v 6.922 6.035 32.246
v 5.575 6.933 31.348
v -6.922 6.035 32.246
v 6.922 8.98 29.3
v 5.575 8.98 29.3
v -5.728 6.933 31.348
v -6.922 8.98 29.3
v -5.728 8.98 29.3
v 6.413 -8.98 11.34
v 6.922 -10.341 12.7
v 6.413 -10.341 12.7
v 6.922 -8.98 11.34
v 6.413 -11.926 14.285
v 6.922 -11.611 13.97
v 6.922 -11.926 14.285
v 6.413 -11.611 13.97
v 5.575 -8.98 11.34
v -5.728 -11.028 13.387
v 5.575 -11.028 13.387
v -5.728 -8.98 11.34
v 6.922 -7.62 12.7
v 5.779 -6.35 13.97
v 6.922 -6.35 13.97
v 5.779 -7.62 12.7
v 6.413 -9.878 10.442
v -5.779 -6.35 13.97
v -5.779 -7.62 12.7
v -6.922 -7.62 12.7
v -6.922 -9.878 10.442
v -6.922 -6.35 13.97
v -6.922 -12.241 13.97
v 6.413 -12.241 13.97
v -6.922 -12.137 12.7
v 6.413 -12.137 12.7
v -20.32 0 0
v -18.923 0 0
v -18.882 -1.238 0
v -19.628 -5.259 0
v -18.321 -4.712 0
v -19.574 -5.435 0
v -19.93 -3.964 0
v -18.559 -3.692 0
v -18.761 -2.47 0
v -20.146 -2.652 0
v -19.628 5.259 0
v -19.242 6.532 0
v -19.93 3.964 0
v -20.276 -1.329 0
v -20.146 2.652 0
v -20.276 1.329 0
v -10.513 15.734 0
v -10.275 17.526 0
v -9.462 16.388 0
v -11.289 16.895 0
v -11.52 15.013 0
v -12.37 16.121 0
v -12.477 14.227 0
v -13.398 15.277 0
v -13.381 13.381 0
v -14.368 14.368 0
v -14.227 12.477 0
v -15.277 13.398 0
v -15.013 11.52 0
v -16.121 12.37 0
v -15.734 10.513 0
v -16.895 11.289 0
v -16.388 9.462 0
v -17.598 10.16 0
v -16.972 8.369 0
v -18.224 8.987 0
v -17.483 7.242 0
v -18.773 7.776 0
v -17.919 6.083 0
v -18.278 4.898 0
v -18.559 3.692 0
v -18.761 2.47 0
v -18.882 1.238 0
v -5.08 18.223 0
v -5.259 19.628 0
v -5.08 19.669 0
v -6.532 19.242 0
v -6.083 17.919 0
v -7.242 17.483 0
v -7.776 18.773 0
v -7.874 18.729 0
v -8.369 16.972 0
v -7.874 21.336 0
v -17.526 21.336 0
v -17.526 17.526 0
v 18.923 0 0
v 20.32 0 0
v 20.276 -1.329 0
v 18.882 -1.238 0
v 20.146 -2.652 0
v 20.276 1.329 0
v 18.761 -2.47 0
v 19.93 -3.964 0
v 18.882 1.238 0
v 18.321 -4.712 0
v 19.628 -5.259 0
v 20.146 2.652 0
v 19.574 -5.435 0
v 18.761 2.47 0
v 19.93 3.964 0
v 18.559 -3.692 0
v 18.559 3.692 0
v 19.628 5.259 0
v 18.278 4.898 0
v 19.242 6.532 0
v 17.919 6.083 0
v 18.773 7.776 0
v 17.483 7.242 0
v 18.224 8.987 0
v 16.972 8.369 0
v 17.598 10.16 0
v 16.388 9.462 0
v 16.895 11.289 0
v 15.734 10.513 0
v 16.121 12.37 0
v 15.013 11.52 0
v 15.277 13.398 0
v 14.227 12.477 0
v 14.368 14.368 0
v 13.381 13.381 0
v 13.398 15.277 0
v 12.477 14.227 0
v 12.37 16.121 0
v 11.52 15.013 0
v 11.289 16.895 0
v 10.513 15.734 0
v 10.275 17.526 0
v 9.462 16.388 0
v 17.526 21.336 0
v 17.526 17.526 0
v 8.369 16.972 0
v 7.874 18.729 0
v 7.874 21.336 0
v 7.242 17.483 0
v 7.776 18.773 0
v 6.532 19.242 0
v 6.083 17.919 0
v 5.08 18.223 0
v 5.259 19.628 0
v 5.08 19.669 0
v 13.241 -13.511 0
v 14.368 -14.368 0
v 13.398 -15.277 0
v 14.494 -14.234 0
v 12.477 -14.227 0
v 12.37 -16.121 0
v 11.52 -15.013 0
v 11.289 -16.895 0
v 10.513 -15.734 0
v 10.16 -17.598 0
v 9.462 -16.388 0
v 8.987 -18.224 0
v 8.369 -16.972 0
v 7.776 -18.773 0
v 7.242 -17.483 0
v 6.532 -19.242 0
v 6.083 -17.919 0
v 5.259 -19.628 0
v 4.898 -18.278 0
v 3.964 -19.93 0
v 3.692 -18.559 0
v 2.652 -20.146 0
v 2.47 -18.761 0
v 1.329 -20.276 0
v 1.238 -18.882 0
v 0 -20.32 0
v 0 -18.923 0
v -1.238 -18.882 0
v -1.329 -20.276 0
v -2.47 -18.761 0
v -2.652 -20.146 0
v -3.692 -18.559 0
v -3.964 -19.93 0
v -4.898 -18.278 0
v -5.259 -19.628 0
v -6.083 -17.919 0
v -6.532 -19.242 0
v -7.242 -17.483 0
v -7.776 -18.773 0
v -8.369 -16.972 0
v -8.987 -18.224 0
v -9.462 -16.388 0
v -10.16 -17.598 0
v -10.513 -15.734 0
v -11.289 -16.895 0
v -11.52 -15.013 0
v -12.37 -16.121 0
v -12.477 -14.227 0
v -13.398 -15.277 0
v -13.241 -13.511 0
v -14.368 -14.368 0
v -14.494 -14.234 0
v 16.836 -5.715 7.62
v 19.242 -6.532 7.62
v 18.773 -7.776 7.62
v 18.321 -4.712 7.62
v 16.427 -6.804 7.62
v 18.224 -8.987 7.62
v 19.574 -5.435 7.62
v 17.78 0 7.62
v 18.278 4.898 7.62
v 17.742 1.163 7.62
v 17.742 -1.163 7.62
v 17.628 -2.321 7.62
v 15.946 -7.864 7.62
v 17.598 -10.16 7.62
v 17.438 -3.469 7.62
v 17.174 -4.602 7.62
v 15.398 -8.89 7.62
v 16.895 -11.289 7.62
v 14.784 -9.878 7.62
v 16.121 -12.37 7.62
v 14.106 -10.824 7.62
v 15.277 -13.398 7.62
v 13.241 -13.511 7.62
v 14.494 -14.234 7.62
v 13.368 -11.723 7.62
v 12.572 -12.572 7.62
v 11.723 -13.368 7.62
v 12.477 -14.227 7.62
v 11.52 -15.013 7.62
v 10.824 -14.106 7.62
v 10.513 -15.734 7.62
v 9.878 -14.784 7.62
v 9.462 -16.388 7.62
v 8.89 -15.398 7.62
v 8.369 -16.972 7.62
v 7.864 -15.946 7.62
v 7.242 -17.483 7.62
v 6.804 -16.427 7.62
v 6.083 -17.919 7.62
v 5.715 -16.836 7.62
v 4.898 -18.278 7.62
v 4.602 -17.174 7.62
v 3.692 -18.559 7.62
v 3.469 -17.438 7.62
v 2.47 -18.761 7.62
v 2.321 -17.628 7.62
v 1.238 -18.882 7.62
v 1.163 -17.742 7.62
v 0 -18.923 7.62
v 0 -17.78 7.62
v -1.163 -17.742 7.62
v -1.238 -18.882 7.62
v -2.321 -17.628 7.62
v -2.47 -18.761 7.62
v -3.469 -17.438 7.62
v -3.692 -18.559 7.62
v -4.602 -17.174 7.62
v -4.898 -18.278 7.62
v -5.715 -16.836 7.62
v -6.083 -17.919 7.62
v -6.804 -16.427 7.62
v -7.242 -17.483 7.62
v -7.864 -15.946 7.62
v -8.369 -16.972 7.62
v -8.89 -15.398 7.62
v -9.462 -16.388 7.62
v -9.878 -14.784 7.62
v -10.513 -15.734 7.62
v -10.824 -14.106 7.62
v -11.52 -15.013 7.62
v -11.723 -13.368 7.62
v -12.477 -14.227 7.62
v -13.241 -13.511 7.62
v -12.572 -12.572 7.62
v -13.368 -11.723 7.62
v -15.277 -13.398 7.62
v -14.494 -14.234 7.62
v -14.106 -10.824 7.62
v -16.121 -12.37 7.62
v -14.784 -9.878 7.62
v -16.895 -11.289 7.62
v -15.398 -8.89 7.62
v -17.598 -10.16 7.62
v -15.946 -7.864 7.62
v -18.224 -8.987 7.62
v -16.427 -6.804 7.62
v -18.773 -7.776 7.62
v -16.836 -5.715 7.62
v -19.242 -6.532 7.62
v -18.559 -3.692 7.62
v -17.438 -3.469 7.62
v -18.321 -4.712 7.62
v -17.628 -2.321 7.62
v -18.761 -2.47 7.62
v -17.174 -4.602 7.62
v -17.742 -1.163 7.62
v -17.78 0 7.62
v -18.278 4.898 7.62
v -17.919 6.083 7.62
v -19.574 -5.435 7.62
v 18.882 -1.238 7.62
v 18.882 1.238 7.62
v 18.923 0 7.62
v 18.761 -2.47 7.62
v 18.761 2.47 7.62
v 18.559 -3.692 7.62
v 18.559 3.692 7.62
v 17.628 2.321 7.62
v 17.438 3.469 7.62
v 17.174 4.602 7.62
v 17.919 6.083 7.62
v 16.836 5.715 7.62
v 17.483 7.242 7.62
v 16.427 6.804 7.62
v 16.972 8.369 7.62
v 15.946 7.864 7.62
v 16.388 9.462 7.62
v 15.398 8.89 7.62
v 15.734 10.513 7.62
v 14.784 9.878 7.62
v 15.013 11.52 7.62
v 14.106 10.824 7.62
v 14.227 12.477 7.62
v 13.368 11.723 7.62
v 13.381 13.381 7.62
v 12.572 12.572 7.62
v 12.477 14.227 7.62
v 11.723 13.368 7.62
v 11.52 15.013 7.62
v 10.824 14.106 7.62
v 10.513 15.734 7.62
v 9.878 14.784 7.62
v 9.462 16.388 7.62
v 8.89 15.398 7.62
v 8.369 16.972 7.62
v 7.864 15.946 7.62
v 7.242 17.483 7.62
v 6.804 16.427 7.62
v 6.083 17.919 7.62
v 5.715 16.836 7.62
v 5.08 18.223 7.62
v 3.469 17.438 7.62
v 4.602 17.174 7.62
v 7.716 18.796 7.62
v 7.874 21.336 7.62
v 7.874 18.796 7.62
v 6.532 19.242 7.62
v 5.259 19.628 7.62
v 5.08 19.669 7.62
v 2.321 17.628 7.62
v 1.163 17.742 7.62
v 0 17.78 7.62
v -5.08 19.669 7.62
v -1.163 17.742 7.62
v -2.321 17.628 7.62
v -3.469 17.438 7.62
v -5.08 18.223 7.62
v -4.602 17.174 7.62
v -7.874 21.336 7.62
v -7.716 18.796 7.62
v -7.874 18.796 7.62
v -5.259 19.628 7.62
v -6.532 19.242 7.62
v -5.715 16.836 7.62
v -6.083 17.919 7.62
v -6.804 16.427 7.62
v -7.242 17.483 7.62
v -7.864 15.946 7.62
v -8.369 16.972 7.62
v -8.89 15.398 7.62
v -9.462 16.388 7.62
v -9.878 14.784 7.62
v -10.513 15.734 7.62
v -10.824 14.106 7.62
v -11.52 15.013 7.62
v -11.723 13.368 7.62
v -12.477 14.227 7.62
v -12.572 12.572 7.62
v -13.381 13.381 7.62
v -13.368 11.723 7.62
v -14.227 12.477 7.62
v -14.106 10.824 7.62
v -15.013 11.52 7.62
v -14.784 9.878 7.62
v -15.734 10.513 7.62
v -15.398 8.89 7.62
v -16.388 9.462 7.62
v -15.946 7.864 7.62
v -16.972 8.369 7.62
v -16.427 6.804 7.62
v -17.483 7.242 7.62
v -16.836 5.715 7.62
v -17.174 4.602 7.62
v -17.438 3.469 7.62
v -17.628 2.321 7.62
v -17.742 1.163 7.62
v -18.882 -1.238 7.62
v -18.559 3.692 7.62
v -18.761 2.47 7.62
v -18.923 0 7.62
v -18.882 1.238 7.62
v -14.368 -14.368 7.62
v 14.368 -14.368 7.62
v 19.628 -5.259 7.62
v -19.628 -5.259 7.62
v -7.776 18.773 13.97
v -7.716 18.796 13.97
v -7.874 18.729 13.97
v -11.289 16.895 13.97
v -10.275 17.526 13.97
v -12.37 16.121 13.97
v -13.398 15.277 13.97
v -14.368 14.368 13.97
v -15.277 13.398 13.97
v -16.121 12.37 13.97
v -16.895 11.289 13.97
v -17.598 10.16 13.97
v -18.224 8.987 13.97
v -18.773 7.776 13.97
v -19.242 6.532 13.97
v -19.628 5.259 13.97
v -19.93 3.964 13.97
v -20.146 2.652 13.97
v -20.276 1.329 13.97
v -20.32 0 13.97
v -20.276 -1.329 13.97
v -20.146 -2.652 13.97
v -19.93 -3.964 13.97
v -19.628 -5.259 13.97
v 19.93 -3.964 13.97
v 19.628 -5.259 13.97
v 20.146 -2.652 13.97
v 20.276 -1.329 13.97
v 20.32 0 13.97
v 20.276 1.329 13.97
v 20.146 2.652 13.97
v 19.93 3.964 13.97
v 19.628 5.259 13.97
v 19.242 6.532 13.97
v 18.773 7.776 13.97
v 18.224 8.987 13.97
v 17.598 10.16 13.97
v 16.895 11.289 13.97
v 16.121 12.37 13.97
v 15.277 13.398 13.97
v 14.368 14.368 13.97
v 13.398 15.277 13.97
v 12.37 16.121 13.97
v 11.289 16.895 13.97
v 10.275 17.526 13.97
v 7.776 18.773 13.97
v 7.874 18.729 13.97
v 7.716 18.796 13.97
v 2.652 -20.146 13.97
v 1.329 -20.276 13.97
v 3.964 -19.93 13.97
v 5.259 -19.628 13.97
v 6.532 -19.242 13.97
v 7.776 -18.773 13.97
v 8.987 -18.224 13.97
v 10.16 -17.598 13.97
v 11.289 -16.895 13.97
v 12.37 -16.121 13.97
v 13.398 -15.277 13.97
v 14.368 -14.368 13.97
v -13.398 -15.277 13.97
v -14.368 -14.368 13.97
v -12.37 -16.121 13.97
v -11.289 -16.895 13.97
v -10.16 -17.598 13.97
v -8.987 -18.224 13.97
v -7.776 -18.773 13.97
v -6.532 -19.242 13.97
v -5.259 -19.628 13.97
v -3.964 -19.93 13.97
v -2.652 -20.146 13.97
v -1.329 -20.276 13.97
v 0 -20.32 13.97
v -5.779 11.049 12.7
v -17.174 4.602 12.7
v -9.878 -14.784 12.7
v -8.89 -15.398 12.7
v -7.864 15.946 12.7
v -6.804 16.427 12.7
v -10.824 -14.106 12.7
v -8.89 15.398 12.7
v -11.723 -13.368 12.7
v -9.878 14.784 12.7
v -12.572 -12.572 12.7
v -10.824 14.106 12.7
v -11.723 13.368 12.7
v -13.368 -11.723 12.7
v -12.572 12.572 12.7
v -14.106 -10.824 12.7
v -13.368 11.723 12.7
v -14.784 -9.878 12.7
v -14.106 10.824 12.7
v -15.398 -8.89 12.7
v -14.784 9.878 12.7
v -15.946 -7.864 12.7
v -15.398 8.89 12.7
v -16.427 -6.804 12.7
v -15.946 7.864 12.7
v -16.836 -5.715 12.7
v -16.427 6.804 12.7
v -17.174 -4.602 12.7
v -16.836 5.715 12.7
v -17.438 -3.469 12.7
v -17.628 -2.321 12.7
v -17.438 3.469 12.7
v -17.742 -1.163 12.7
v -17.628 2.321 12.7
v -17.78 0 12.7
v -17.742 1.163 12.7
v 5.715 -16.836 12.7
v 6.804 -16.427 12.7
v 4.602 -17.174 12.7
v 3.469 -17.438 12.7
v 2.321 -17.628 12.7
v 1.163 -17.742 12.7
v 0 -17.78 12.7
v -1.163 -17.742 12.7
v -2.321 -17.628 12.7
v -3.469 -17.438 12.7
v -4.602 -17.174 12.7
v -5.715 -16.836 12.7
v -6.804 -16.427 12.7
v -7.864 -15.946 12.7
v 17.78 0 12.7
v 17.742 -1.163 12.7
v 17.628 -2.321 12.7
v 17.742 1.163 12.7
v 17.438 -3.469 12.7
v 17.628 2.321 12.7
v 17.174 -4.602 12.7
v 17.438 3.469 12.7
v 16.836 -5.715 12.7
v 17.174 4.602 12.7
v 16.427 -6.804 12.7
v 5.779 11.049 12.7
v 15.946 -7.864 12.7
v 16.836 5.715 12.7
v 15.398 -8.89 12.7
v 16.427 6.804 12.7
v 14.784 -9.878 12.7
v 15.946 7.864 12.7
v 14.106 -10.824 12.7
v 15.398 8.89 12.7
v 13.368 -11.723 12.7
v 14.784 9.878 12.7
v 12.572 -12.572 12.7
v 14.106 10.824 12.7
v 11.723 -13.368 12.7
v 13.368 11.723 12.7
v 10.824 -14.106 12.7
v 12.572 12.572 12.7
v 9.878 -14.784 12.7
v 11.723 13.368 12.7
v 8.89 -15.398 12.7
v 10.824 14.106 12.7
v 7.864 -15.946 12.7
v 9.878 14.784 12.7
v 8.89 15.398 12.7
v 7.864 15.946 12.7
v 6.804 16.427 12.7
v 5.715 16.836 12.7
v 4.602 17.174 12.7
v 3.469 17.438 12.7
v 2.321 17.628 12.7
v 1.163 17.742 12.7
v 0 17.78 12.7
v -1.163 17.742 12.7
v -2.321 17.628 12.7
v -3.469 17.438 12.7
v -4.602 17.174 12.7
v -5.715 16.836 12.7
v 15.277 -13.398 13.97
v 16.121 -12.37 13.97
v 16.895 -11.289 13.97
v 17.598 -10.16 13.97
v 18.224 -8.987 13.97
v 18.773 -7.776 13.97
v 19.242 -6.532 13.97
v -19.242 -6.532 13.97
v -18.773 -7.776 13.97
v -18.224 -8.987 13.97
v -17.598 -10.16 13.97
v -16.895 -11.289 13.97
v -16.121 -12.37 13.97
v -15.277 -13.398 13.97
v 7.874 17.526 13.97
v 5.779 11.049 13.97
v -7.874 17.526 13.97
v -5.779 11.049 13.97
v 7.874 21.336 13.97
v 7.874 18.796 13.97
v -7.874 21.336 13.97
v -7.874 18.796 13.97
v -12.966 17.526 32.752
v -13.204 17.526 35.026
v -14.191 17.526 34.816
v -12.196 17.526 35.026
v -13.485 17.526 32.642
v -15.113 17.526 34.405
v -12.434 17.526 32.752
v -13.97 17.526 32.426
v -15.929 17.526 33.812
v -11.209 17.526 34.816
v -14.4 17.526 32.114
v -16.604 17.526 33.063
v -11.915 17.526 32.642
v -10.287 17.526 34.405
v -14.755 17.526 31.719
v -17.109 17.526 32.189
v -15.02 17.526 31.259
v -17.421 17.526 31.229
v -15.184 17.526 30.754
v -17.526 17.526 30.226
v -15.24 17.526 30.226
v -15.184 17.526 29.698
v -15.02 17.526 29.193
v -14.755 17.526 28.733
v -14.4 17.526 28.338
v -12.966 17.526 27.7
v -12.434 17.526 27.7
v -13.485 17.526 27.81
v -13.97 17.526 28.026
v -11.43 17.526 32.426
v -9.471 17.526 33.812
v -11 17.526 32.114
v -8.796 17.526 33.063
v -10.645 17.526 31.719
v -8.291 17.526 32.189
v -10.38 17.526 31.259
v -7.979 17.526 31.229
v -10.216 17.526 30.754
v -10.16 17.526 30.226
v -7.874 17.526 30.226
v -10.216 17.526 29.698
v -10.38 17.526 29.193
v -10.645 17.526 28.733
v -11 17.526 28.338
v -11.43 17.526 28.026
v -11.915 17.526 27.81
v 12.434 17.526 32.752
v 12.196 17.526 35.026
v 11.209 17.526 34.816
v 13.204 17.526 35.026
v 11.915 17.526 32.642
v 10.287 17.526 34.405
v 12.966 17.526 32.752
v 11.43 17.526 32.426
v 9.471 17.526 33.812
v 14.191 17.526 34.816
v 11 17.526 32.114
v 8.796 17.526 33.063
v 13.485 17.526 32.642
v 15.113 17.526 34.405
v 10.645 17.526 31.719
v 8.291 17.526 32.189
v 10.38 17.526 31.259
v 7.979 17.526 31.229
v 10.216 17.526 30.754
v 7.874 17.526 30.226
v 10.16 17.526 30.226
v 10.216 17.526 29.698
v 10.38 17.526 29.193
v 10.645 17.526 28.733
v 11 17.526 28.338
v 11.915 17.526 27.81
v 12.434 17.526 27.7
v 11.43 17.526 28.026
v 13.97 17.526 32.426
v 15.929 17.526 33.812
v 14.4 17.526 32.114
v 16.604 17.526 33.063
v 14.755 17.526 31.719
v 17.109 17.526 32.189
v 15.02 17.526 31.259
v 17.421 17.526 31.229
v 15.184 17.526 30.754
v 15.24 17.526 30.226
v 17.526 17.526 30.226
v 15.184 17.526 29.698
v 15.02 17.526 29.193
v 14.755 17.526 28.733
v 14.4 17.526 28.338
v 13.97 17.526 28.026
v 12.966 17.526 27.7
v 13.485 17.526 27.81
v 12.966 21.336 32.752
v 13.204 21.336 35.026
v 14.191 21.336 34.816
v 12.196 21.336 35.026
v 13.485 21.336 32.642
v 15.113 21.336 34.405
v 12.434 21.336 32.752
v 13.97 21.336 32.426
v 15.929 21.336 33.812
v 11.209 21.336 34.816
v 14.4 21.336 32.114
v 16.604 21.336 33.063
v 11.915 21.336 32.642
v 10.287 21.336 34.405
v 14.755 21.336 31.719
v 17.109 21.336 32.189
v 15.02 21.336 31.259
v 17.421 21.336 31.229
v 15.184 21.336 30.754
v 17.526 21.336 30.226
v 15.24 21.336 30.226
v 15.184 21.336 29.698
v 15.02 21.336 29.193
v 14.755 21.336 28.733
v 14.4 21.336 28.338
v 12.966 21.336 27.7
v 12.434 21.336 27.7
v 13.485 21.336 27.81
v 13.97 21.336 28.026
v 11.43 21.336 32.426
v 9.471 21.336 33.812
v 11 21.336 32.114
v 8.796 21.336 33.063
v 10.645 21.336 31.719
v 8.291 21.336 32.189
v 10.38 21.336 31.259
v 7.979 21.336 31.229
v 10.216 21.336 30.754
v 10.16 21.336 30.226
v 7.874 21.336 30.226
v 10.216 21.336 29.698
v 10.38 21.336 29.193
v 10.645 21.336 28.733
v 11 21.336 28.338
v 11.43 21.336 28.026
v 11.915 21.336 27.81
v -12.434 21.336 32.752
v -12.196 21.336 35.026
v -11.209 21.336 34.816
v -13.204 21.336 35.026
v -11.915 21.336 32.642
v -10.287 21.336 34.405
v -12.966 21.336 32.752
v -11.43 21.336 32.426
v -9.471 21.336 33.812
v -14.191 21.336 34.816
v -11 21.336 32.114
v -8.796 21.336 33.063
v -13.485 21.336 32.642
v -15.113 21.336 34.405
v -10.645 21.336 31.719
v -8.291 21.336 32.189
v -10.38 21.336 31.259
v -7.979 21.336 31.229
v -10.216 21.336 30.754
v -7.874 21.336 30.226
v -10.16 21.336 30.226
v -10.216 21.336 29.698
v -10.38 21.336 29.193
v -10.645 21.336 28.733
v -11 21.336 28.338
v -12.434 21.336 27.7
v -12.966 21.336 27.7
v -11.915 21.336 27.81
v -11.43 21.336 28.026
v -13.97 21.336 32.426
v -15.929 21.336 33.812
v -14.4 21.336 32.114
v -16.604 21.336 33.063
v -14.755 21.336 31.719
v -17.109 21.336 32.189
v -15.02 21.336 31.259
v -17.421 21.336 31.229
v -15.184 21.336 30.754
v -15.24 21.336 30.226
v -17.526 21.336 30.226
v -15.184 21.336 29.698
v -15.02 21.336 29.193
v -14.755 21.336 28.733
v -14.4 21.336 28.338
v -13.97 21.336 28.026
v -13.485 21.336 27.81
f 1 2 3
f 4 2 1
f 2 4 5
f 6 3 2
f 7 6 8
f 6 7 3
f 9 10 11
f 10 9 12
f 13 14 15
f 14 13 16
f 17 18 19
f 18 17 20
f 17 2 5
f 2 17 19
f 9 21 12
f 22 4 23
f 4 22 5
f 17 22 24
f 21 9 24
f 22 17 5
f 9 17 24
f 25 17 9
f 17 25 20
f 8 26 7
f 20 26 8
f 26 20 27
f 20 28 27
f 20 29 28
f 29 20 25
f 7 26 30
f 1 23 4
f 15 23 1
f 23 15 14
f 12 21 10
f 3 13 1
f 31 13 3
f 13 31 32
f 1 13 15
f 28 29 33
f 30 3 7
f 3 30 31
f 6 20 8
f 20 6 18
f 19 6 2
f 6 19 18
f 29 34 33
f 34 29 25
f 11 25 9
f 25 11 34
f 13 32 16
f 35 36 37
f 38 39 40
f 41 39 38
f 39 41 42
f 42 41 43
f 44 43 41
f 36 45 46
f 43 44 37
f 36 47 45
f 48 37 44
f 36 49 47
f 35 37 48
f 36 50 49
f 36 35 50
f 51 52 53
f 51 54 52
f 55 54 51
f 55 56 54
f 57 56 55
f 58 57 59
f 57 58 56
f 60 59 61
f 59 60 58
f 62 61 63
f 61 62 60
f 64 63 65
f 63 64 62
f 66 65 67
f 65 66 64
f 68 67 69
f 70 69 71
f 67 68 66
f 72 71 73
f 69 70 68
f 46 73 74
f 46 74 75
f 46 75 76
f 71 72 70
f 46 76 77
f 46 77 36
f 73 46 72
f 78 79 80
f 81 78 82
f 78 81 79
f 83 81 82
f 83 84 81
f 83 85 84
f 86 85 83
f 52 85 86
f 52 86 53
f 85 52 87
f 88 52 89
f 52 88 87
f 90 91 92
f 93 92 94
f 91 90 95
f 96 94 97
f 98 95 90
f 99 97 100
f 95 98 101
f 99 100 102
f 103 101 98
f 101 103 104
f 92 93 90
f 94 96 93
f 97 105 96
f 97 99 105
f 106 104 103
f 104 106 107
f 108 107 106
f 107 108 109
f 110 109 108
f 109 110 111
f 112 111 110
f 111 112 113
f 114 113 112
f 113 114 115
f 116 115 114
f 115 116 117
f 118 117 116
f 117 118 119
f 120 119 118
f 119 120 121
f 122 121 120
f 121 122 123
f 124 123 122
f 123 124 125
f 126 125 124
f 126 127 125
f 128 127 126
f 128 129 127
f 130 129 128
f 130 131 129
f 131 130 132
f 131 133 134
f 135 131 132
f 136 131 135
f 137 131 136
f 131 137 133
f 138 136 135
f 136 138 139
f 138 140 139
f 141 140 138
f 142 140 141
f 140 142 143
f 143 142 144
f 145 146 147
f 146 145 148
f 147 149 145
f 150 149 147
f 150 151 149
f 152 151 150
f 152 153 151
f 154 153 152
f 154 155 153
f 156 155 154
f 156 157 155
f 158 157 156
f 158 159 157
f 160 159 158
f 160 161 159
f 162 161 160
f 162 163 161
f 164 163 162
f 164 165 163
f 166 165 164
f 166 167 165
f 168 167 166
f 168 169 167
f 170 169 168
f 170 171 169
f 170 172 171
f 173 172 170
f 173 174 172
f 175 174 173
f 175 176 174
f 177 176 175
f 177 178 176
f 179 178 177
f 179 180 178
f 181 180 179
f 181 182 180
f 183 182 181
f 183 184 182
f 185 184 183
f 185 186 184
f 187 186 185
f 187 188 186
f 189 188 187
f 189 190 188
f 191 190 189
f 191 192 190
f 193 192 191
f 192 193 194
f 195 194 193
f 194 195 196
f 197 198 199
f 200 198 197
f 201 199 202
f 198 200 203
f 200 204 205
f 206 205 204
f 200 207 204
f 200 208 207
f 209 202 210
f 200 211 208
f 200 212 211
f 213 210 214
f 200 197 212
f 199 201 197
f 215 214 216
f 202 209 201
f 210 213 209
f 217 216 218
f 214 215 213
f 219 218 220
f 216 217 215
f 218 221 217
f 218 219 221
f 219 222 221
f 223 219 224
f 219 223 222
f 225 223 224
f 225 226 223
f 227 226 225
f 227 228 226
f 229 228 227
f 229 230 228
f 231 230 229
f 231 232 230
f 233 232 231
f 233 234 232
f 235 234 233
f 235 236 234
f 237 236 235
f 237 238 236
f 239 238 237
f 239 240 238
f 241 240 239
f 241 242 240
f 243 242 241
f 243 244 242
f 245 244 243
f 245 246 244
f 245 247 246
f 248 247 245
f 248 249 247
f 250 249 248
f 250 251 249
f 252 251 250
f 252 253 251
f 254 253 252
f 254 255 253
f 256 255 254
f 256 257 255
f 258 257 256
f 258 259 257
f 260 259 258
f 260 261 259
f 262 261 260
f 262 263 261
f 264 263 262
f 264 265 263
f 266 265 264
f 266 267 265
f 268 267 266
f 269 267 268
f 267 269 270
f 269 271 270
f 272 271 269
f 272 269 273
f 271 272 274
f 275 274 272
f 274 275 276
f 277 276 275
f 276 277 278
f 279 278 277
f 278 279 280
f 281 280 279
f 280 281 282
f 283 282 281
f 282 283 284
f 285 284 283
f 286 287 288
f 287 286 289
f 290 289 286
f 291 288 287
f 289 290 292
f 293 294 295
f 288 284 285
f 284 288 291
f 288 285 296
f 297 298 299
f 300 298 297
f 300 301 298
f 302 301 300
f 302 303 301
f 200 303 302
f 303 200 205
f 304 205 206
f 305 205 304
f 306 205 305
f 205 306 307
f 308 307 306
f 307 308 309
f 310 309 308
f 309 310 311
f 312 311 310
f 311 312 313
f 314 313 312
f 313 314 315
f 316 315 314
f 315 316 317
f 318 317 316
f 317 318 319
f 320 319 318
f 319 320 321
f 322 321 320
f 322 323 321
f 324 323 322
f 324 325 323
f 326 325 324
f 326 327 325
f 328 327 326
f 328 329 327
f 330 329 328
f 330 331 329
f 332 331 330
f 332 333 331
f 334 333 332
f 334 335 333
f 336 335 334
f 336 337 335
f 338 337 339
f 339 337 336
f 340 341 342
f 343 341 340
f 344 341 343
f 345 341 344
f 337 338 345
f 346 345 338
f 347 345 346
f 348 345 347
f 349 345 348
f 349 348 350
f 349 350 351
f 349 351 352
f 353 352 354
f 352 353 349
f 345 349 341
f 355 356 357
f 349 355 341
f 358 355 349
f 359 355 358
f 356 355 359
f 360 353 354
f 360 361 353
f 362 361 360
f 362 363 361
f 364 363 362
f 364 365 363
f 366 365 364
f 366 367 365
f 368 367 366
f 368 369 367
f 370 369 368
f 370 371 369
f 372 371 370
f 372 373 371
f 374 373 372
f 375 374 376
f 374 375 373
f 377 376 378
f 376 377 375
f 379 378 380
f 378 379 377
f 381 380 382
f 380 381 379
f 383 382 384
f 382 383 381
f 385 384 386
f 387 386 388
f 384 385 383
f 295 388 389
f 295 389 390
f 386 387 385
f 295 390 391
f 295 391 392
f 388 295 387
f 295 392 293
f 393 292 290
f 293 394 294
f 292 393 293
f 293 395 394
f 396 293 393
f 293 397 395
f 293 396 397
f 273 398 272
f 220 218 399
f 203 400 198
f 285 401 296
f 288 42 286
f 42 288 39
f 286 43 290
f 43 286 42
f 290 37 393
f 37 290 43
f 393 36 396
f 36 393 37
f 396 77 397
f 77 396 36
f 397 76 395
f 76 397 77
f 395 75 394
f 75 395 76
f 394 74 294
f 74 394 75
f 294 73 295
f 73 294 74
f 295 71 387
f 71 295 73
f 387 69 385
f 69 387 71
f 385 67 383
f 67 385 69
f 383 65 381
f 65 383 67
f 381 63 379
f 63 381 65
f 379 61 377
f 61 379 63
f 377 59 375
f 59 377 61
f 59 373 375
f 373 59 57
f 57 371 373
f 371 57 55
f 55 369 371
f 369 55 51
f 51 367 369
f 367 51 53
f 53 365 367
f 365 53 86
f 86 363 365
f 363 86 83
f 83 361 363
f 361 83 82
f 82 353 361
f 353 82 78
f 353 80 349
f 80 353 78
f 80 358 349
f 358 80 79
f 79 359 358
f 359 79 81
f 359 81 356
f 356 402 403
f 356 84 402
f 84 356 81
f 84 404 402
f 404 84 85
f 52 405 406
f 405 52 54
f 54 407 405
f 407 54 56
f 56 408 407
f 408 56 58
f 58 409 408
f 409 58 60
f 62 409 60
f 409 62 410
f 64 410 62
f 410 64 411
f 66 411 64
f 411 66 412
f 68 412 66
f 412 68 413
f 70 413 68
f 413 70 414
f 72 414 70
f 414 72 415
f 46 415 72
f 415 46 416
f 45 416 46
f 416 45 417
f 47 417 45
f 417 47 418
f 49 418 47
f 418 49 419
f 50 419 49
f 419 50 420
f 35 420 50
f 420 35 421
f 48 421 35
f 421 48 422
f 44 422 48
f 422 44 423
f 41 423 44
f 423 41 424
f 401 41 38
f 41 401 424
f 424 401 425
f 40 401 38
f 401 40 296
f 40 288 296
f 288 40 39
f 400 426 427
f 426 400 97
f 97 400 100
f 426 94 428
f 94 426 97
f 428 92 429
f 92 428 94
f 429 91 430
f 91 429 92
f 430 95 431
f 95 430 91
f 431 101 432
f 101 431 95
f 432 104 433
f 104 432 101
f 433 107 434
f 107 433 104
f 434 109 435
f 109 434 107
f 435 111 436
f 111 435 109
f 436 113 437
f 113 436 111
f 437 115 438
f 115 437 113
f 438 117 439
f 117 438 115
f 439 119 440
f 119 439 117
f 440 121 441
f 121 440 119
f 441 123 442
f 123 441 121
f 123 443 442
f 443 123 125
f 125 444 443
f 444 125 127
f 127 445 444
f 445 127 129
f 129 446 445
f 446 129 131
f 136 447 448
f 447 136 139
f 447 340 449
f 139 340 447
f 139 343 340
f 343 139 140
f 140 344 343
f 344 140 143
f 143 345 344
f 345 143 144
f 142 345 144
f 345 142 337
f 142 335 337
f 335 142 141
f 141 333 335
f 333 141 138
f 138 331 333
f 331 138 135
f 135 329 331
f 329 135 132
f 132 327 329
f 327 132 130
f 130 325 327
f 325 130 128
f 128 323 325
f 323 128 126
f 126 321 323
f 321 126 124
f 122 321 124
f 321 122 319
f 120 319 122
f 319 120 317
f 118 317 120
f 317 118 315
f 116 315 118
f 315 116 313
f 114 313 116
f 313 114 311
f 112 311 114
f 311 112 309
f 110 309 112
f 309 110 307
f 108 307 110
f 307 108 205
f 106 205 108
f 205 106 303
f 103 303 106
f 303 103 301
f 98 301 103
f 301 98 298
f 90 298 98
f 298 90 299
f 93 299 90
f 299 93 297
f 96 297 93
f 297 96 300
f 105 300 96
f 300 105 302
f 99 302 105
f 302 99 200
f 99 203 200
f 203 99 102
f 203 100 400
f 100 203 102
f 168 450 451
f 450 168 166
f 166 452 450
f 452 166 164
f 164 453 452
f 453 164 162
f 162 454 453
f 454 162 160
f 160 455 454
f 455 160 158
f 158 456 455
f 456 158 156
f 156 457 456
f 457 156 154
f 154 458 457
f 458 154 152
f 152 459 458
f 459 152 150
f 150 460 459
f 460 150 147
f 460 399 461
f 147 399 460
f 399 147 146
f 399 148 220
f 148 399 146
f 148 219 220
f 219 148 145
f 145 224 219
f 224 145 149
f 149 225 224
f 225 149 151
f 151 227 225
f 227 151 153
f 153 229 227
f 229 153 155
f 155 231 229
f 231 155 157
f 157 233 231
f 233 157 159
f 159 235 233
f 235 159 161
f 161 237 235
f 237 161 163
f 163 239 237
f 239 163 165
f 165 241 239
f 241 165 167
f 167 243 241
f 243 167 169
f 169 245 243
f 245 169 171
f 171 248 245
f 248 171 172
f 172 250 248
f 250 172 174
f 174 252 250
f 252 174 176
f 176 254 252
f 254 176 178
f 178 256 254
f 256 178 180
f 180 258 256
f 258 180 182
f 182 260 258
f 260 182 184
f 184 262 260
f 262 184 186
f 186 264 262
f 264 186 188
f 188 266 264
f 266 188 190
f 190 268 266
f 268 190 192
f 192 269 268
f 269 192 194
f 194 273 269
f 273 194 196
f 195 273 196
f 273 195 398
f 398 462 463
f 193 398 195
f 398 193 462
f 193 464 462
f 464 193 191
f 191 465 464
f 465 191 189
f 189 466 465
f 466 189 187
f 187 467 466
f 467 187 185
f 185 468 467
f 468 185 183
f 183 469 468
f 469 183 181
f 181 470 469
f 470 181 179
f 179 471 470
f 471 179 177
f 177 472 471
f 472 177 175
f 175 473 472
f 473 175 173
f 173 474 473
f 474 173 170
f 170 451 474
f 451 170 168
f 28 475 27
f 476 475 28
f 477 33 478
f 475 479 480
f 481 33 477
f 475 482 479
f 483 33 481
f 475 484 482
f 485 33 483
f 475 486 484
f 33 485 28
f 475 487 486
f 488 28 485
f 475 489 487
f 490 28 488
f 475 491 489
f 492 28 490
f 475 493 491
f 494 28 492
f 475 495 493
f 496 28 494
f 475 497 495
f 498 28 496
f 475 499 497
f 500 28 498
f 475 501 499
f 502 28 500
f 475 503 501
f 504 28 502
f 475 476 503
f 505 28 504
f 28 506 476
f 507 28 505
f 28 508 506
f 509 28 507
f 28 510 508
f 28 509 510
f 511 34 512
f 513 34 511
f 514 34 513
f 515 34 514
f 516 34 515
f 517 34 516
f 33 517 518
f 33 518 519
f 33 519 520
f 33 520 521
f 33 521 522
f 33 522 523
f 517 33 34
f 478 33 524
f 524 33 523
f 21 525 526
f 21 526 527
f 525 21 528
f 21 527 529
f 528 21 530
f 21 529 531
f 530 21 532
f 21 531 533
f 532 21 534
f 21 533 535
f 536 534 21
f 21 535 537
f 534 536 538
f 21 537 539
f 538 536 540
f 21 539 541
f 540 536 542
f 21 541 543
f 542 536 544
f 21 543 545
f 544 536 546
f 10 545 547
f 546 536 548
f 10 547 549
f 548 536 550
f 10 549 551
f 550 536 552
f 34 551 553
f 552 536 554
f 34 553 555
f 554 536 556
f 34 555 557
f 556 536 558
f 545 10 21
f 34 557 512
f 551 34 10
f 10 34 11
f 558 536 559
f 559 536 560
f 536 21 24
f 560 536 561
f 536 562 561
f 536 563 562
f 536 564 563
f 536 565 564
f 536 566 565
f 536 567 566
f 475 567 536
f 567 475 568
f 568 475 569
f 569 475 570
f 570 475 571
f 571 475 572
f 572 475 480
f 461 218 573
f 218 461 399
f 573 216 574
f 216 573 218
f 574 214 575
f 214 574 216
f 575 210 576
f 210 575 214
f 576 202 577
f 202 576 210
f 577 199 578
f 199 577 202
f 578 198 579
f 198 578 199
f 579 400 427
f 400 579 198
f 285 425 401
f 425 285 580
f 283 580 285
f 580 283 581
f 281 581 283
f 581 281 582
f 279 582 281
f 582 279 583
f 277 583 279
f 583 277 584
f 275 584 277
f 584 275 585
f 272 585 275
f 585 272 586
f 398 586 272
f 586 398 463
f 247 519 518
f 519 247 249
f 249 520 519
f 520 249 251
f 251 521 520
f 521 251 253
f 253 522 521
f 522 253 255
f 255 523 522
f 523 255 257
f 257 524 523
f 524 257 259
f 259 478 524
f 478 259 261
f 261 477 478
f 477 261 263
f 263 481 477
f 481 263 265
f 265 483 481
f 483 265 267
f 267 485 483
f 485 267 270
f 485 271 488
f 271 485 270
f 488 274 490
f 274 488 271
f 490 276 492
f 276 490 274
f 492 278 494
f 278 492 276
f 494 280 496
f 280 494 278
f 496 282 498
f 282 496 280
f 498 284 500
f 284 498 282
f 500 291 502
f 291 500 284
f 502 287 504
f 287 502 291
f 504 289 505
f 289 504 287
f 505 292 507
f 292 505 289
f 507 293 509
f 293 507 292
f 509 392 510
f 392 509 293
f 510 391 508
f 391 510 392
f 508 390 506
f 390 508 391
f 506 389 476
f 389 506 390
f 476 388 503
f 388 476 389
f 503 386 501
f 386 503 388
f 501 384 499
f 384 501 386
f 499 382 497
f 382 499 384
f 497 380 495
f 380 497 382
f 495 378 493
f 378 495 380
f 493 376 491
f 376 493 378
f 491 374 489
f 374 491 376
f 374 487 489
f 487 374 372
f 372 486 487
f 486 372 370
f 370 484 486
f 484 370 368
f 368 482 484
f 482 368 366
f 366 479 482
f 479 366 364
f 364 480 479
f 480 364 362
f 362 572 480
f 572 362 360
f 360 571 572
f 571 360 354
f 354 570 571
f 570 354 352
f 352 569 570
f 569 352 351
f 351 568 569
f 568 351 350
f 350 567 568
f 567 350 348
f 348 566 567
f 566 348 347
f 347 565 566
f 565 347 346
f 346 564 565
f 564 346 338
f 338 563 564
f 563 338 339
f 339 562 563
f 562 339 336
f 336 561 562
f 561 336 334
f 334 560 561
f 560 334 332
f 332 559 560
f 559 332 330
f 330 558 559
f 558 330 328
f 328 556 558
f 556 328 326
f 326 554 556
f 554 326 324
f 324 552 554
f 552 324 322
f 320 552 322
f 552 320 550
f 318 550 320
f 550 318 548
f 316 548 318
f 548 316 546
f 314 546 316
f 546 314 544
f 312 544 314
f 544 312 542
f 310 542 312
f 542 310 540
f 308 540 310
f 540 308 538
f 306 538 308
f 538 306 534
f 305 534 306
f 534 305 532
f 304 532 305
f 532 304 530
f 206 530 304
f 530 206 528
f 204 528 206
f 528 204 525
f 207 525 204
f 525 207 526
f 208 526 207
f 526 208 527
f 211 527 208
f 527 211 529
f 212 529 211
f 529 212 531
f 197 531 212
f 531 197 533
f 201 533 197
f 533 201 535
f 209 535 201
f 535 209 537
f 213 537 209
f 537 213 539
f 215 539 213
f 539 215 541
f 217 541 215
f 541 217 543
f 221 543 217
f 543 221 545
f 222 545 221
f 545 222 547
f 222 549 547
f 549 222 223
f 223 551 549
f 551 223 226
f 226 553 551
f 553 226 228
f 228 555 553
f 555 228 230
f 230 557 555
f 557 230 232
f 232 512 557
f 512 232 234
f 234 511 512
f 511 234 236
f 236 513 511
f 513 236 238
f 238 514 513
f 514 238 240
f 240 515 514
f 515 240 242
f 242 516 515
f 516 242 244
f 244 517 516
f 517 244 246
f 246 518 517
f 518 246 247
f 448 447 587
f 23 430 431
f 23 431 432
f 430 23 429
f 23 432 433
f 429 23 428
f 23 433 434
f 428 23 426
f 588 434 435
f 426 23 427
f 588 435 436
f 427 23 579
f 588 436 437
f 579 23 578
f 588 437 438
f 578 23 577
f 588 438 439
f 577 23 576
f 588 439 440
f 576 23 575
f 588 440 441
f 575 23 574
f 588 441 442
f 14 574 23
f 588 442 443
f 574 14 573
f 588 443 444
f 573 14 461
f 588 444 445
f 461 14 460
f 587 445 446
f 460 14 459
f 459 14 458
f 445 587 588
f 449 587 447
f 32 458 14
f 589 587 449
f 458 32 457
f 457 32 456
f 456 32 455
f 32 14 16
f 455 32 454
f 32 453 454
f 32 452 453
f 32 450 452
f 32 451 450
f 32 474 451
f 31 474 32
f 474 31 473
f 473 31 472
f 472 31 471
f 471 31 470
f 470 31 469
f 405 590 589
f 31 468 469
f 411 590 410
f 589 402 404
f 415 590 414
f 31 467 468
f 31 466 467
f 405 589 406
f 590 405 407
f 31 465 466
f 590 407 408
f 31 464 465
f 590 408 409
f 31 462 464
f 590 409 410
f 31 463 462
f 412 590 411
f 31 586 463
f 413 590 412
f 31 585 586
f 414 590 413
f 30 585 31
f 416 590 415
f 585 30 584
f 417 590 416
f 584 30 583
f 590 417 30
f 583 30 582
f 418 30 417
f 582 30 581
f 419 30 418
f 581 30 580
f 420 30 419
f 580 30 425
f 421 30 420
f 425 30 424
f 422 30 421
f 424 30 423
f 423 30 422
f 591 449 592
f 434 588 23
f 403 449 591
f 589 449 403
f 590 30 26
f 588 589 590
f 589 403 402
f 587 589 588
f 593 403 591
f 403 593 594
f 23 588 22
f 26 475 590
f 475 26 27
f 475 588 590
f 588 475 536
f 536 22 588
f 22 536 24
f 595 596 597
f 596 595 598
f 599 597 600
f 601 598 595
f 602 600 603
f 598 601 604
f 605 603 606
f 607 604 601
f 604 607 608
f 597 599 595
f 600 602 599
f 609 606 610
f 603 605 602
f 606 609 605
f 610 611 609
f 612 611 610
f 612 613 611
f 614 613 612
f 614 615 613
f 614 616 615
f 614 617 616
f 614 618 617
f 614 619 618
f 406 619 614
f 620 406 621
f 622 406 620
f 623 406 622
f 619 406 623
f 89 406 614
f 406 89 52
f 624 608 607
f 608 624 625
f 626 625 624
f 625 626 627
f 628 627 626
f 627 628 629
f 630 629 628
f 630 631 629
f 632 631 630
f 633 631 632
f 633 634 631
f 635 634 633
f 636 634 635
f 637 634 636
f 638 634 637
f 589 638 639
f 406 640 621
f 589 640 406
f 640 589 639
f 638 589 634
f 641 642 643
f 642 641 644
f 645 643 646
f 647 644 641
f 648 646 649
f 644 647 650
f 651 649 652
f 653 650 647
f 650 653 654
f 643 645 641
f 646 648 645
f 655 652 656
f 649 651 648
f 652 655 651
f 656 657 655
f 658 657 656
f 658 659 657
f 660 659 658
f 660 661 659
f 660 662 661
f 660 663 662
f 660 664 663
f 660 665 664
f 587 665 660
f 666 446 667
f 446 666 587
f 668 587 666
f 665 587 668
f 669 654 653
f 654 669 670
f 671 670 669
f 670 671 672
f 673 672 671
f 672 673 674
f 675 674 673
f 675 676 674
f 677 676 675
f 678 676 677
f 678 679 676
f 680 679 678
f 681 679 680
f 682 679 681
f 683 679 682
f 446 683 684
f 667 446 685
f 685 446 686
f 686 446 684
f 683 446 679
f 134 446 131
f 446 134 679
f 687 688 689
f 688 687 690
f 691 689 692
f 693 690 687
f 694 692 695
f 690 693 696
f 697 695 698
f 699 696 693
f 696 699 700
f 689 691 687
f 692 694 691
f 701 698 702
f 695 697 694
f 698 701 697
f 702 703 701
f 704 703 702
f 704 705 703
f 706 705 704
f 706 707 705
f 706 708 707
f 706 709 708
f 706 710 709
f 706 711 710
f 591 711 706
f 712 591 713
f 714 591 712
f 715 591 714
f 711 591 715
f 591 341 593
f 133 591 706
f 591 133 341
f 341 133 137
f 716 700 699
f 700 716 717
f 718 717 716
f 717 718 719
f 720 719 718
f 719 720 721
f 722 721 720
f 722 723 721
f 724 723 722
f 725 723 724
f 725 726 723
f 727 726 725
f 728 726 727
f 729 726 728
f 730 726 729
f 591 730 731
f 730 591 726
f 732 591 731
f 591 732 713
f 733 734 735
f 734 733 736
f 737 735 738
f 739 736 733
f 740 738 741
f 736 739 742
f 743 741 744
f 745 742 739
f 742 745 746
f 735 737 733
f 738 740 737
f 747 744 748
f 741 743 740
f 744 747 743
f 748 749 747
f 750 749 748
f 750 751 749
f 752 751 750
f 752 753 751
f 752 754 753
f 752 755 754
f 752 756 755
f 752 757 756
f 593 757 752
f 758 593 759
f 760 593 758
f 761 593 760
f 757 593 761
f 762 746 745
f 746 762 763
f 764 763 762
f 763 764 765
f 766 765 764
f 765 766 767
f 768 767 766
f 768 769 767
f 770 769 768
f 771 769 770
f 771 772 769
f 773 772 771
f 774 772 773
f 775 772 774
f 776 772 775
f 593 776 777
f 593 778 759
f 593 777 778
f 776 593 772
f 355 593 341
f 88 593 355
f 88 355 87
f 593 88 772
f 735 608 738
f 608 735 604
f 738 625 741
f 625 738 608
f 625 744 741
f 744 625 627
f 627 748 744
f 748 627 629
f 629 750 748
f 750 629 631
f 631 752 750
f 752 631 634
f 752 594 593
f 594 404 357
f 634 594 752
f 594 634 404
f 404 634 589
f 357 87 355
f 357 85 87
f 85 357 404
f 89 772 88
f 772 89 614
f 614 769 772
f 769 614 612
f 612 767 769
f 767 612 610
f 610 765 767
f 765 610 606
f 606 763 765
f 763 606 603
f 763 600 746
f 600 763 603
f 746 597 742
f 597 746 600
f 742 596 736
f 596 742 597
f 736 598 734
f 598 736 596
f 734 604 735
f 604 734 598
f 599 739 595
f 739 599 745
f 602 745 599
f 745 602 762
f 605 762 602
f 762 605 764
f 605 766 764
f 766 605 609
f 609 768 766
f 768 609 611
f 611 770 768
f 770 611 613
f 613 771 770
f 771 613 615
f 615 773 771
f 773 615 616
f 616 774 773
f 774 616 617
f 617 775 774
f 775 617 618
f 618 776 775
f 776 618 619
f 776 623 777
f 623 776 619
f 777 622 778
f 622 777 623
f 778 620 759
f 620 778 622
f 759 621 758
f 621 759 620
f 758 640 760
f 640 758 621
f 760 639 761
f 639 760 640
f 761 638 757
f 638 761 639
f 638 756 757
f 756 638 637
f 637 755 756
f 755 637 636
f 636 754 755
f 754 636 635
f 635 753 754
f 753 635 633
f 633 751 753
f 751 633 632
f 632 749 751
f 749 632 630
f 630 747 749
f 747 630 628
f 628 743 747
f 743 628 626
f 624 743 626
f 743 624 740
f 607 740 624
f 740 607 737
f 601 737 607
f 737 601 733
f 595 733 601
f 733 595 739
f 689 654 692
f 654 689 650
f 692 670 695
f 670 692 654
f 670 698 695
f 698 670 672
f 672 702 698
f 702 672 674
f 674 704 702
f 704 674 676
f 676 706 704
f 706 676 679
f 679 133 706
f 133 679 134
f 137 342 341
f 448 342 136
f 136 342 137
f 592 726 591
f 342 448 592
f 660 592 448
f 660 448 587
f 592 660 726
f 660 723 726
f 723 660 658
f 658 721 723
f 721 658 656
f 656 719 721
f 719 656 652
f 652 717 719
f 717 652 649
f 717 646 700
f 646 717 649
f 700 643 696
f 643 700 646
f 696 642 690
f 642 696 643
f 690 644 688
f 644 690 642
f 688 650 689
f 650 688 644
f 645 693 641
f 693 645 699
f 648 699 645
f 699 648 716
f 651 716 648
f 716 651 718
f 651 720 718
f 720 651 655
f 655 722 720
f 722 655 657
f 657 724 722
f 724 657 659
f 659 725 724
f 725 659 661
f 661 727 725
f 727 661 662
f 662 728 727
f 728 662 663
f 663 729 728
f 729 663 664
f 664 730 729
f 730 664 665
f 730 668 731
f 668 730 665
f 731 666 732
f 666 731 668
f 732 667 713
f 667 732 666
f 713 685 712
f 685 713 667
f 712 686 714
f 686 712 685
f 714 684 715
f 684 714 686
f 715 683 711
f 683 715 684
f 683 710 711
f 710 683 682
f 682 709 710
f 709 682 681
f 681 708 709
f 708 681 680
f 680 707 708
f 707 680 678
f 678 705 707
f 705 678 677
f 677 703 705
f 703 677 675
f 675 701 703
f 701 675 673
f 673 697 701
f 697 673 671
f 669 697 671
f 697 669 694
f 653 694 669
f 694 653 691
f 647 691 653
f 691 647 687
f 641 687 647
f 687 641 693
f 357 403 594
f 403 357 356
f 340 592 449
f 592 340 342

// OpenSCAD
ViewScale = [0.0254, 0.0254, 0.0254];

module cutouts()
{
   difference() {
        circle(1600/2, $fn=96);
        circle(1490/2, $fn=96);
        // tab
        translate([0, 700, 0])
        square([400, 200], center=true);
        // tab
        rotate([0, 0, 120]) 
        translate([0, 700, 0])
        square([400, 200], center=true);
        // tab
        rotate([0, 0, 240]) 
        translate([0, 700, 0])
        square([400, 200], center=true);
    }
}

//module rotcutouts() {
//    for(ii=[0:90:360]) {
//        rotate([0, 0, ii])
//        translate([0, 500, 0])
//        square([400, 200], center=true);
//    }
//}

module bodymain()
{
    difference() {
        circle(1600/2, $fn=96);
        circle(1400/2, $fn=96);
    }
}

//module bodycutout()
//{
//    difference() {
//        circle(1460/2, $fn=96);
//        circle(1360/2, $fn=96);
//        *square([1020, 1020], center=true);
//        translate([0, 700, 0])
//        square([400, 200], center=true);
//        scale([1.3,1.3,1.3])
//        translate([0, 500, 0])
//        square([400, 200], center=true);
//        //rotcutouts();
//    }
//}

module bodycutout2()
{
    difference() {
        circle(1460/2, $fn=96);
        circle(1360/2, $fn=96);
        scale([1.3,1.3,1.3])
        translate([0, 500, 0])
        square([400, 200], center=true);
        //rotcutouts();
    }
}

//module ledframe2()
//{
//    difference() {
//    square([1030, 1030], center=true);
//    square([800, 800], center=true);
//    rotcutouts();
////    translate([0, 500, 0])
////    square([400, 200], center=true);
//    }
//}
//
//module ledframe1()
//{
//    difference() {
//        square([1030, 1030], center=true);
//        square([900, 900], center=true);
//        rotcutouts();
//    }
//}

//module support()
//{
//    difference() {
//    square([860, 860], center=true);
//    square([760, 760], center=true);
//    }
//}

module mirror()
{
    translate([-525/2, 0, 500])
    rotate([135, 0, 0]) {
        translate([-10, 0, -500]) {
        linear_extrude(1000)
        difference() {
            square([545, 164]);
            translate([94/2, 0, 0])
            square([445, 114]);
        }
        translate([0, 0, 1000])
        linear_extrude(50)
        square([525, 164]);
    }}
}

module cap() 
{
    difference() {
        circle(1600/2, $fn=96);
        square([455, 870], center=true);
    }
}

module vexmount1()
{
    difference() {
        hull() {
            circle(380/2);
            translate([0, 1000, 0])
            square([380, 380], center=true);
        }
        circle(200/2);
    }
}


module vexmount()
{
    linear_extrude(150) {
        vexmount1();
        translate([1000, 0, 0])
        vexmount1();
    }
}

module mountsupport()
{
    square([700, 100], center=true);
}

scale(ViewScale)
{
//    #linear_extrude(200){
//        ledframe1();
//        bodycutout();
//    }
//    #linear_extrude(170)
//    support();
//
//    #translate([0, 0, 200])
//    linear_extrude(200)
//    bodycutout2();
//
//    #translate([0, 0, 200])
//    linear_extrude(200)
//    ledframe2();

    translate([0, 0, 0])
    linear_extrude(300)
    cutouts();

    translate([0, 0, 300])
    linear_extrude(200)
    bodymain();

    translate([0, 0, 500])
    linear_extrude(50)
    cap();

    translate([0, 0, 300])
    mirror();

    translate([-500, 690, 1190])
    rotate([-90, 0, 0])
    vexmount();

    translate([0, 790, 300])
    linear_extrude(250)
    mountsupport();

}
